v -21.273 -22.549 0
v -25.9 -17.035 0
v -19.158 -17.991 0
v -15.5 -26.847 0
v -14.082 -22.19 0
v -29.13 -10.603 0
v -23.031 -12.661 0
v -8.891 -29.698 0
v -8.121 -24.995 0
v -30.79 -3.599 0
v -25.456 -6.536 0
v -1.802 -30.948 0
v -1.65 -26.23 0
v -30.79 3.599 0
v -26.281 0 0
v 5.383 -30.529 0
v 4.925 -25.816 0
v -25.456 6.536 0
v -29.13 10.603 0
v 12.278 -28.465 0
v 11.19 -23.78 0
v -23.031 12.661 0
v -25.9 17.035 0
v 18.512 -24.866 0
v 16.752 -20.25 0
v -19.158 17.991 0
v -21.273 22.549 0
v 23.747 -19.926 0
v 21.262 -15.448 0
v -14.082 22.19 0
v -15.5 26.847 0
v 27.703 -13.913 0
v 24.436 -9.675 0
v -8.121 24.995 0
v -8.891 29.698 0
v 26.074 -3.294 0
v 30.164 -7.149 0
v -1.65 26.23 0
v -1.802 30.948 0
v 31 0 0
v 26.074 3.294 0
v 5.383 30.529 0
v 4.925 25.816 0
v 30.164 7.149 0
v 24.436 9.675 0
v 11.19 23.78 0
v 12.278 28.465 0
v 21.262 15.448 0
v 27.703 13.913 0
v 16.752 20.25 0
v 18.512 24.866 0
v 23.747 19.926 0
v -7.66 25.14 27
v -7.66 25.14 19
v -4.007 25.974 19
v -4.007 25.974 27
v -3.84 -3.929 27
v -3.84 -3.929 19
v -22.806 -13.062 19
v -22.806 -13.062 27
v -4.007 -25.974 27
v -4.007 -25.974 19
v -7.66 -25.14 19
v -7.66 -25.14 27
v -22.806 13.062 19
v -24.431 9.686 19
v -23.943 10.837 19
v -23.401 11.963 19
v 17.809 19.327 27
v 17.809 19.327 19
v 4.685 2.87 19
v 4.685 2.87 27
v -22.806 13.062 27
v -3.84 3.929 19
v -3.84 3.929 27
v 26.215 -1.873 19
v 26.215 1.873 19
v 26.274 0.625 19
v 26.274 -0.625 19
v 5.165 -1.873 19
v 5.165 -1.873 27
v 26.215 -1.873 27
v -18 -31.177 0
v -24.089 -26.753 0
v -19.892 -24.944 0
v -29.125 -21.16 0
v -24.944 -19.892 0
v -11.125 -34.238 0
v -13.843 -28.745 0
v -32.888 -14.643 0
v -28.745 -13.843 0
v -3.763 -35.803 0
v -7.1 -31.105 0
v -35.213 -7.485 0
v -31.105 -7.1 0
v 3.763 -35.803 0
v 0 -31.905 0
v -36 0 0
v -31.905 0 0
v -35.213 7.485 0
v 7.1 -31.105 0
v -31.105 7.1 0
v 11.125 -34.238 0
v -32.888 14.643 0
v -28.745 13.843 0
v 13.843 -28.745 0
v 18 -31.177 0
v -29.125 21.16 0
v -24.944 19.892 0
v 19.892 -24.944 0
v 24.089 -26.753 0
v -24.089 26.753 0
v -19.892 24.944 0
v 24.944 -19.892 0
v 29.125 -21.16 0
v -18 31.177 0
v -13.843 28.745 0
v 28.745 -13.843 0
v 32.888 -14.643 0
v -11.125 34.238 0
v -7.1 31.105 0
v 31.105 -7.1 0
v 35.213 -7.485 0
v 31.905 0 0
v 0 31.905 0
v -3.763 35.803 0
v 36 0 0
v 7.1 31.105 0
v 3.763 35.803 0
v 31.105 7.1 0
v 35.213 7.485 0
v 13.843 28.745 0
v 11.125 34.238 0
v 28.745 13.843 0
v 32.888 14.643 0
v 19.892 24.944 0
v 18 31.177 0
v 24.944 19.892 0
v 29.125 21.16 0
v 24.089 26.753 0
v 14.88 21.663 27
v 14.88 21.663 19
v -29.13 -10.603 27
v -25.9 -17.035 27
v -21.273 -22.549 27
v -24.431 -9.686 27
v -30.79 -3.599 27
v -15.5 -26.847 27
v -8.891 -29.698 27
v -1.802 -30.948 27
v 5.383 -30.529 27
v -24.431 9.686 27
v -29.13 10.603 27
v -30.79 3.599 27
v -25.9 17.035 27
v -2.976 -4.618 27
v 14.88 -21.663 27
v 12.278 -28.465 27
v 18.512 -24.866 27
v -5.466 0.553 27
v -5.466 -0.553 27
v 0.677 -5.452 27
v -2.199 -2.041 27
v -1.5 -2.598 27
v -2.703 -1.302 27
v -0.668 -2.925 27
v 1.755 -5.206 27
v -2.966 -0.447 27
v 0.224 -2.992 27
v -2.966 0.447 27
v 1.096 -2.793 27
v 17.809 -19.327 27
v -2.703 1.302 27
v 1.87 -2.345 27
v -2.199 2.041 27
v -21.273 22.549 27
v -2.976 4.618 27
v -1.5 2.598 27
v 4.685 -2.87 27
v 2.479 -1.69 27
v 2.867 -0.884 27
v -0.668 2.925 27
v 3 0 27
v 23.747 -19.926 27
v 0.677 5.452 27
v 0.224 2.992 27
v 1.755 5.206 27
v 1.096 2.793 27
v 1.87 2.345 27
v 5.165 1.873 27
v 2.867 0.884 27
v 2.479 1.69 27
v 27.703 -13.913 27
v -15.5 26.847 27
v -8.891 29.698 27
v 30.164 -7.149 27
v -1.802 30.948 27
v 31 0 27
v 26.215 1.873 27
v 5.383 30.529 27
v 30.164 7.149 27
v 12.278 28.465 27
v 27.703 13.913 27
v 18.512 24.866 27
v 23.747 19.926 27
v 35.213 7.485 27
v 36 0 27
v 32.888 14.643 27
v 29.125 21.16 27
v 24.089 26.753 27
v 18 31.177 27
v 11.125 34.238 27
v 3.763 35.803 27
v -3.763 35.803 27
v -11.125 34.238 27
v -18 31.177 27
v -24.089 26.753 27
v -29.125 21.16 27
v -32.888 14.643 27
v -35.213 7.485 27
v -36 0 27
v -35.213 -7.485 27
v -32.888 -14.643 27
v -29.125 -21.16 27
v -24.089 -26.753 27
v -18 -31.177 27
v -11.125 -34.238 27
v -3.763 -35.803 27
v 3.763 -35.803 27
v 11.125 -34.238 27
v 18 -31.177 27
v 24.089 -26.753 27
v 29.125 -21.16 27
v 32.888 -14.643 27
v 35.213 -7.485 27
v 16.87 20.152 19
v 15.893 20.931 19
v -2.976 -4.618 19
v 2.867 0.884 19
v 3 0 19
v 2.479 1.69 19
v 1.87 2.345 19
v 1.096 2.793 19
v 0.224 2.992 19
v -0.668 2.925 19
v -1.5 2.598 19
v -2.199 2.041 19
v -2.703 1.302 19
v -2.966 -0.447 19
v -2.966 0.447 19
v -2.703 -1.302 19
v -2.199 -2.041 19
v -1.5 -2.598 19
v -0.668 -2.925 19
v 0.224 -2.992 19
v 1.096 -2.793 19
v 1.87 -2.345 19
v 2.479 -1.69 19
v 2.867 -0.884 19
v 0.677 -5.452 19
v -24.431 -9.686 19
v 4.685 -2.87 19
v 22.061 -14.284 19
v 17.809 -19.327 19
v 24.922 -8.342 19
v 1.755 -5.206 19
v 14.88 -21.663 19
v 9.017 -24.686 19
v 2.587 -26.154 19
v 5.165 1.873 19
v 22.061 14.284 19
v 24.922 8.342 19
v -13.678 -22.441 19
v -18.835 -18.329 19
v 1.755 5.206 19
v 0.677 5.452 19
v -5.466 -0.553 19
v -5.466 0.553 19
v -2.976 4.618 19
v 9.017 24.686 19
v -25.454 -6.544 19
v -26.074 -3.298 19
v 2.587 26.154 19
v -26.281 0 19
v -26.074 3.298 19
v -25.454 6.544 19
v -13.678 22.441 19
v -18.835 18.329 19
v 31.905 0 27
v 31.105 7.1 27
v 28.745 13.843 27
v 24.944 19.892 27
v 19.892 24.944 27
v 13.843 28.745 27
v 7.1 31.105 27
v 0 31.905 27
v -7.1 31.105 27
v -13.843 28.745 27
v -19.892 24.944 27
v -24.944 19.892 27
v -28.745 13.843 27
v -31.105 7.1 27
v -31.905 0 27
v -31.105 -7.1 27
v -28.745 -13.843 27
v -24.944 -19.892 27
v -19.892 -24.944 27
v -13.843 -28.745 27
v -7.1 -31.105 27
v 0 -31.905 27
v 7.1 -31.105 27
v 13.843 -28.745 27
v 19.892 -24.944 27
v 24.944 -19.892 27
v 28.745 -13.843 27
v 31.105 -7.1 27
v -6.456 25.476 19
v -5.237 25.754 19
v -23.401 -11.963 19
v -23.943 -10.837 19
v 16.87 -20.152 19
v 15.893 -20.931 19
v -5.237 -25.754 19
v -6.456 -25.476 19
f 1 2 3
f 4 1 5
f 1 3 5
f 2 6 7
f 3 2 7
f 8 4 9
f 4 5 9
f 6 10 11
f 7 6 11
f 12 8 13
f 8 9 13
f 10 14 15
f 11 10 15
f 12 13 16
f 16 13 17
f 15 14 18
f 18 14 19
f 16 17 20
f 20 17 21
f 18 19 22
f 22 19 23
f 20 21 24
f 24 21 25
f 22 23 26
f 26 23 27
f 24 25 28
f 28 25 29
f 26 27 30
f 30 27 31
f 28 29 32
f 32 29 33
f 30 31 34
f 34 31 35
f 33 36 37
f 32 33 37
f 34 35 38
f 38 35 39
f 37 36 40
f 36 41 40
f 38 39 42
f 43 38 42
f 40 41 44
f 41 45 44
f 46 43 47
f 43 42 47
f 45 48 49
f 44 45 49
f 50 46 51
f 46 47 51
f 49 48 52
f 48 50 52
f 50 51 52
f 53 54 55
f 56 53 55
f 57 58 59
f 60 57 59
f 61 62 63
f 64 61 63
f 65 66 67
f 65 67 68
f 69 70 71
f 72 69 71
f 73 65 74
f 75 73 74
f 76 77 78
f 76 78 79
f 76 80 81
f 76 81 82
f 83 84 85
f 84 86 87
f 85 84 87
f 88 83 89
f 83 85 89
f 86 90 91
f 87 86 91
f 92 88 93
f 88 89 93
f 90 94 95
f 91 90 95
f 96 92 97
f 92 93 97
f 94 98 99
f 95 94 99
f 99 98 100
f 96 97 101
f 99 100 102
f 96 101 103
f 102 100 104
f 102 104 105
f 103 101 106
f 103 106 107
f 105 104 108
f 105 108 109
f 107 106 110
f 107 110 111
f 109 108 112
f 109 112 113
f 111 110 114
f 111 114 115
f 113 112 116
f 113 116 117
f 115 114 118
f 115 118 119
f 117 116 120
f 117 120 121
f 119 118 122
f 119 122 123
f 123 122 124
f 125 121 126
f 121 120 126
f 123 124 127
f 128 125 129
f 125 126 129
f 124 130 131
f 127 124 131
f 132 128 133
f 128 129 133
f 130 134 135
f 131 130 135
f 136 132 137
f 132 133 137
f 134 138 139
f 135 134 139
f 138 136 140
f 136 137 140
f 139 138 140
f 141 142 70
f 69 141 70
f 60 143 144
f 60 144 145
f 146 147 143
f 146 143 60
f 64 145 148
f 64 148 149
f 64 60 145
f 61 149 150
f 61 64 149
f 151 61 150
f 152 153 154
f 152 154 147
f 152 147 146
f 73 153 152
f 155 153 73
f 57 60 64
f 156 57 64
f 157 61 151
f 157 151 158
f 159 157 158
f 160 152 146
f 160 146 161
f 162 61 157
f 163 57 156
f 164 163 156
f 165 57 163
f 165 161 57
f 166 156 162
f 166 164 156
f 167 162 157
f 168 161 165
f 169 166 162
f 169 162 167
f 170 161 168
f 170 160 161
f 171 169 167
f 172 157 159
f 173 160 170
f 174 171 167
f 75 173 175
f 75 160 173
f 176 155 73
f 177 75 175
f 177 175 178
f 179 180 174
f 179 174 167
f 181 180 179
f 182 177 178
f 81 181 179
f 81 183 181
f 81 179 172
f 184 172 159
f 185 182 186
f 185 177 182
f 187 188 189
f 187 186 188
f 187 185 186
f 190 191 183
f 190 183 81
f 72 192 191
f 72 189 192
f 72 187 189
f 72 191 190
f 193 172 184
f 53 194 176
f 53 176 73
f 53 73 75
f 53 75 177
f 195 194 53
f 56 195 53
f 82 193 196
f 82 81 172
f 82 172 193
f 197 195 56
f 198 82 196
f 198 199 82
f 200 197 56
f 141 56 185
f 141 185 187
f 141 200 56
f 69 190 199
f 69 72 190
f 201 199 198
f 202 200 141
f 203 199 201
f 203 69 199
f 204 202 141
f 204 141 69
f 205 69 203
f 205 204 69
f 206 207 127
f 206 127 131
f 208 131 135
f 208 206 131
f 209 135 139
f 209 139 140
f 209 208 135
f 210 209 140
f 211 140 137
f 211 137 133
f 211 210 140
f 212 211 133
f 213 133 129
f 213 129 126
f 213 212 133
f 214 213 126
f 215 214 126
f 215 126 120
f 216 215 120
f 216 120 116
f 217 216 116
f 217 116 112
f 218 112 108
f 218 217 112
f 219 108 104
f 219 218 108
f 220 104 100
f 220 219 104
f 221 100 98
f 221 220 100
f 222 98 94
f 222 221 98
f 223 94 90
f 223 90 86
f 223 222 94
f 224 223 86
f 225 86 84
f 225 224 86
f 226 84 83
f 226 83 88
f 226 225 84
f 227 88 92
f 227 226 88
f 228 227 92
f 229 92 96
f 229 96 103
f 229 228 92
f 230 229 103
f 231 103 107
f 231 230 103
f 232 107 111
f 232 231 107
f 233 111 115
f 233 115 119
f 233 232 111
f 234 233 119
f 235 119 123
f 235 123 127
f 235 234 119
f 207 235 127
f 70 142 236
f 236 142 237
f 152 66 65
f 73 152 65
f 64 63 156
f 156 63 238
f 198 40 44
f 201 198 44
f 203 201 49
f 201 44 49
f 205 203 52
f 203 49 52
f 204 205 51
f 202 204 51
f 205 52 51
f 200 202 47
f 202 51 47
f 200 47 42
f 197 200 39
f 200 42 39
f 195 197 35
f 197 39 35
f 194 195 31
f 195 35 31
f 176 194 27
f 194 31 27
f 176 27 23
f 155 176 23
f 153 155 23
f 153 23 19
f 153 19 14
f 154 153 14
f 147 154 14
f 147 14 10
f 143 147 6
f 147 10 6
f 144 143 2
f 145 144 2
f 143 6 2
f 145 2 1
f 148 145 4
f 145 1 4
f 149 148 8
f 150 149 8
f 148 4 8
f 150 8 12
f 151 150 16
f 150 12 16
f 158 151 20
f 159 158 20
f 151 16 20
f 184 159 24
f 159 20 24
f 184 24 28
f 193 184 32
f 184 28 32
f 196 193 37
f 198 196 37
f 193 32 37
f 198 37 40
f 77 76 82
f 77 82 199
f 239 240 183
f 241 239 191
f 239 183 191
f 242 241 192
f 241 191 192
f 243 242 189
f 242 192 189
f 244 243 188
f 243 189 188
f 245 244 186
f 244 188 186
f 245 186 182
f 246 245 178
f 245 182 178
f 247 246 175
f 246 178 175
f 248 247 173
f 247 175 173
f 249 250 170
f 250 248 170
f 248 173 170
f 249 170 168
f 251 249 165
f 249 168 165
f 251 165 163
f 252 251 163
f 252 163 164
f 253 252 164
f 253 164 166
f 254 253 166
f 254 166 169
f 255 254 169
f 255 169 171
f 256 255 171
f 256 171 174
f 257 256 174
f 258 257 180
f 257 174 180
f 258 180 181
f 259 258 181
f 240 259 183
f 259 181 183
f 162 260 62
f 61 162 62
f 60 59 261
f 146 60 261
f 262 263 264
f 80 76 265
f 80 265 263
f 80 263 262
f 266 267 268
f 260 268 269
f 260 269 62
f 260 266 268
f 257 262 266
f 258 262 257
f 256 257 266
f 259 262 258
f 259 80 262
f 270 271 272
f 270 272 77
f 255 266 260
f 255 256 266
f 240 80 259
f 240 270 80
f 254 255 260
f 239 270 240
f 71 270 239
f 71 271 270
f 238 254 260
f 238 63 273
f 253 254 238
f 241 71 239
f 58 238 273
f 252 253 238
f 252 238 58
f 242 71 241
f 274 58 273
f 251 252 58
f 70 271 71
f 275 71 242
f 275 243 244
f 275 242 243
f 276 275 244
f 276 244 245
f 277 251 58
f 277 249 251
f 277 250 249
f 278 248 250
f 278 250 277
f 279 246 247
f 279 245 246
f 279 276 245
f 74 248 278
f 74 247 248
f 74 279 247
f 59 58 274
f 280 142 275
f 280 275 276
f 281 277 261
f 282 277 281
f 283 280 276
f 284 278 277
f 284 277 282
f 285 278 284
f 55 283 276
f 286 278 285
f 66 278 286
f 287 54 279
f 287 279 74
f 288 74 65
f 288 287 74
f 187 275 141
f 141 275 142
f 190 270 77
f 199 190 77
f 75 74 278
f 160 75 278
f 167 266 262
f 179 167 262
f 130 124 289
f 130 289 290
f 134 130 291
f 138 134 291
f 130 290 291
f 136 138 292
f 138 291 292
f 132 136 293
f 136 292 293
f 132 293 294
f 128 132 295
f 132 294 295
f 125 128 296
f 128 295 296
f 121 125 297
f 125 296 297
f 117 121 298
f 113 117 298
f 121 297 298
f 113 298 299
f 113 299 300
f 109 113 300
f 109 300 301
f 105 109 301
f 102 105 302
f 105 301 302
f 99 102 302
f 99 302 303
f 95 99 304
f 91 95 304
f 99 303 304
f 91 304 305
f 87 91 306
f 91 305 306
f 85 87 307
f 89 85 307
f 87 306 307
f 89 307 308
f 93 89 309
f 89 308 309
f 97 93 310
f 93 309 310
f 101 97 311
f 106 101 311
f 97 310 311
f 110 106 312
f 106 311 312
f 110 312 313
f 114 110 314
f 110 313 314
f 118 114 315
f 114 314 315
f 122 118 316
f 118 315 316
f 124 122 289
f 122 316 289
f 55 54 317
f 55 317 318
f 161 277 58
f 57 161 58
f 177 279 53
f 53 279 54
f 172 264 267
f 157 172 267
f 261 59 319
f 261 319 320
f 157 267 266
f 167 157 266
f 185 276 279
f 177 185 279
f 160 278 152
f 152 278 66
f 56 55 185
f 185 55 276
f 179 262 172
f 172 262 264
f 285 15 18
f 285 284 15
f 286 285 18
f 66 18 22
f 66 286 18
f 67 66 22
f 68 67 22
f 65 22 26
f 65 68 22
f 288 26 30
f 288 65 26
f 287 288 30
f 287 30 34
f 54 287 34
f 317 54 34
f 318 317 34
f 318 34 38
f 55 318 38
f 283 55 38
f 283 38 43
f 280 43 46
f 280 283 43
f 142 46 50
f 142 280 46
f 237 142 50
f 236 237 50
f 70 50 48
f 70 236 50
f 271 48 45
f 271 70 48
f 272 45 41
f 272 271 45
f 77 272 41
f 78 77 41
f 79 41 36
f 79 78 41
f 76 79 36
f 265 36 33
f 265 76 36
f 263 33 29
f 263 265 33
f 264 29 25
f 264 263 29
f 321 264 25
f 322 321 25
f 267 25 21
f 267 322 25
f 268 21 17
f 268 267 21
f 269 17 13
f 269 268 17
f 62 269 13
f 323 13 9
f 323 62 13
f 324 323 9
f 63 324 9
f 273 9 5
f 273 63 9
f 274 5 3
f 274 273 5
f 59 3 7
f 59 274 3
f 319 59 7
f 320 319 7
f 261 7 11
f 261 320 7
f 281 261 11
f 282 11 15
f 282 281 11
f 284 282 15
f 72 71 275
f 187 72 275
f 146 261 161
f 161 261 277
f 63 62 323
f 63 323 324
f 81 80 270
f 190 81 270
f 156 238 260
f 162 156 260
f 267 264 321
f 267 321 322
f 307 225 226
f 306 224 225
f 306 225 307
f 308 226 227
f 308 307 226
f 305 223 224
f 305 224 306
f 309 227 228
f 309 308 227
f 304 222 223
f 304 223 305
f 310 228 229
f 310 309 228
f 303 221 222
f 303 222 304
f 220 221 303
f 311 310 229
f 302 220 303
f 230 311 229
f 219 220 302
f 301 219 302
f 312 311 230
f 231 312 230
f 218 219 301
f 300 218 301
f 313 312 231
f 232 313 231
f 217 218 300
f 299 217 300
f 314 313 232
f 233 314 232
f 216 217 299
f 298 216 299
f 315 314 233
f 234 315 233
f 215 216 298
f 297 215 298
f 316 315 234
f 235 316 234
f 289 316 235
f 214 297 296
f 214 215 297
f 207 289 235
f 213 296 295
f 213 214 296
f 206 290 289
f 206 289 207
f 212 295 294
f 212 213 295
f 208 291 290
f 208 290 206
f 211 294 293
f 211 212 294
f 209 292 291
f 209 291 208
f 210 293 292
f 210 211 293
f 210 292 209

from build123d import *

# Parameters (mm, degrees)
ESQUISSE1_R             = 31
ESQUISSE1_W             = 21.049984125
ESQUISSE1_H             = 3.746915328
BOSS_EXTRU_1_DEPTH      = 27
ESQUISSE2_R             = 3
ENL_V_MAT_EXTRU_1_DEPTH = 27
ESQUISSE3_R             = 36
ESQUISSE3_R_2           = 31.904878758
BOSS_EXTRU_2_DEPTH      = 27
ENL_V_START             = -19
ESQUISSE4_R             = 26.281409308
ESQUISSE4_R_2           = 3
ENL_V_MAT_EXTRU_2_DEPTH = 19


with BuildPart() as part:
    # Esquisse1 → Boss.-Extru.1 (new body)
    with BuildSketch(Plane.XY):
        Circle(ESQUISSE1_R)
        with Locations((15.689557936, 0)):
            Rectangle(ESQUISSE1_W, ESQUISSE1_H, mode=Mode.SUBTRACT)
        Polygon((1.75532597, -5.20590194), (4.684782335, -2.869738445), (17.809232767, -19.32727874), (14.879776402, -21.663442235), align=None, mode=Mode.SUBTRACT)
        Polygon((-2.97571019, -4.618195874), (0.677262147, -5.451962973), (-4.00679998, -25.974180047), (-7.659772317, -25.140412949), align=None, mode=Mode.SUBTRACT)
        Polygon((-5.465975884, -0.552894122), (-3.840250251, -3.928748182), (-22.805630618, -13.061994003), (-24.431356251, -9.686139942), align=None, mode=Mode.SUBTRACT)
        Polygon((-3.840250251, 3.928748182), (-5.465975884, 0.552894122), (-24.431356251, 9.686139942), (-22.805630618, 13.061994003), align=None, mode=Mode.SUBTRACT)
        Polygon((0.677262147, 5.451962973), (-2.97571019, 4.618195874), (-7.659772317, 25.140412949), (-4.00679998, 25.974180047), align=None, mode=Mode.SUBTRACT)
        Polygon((4.684782335, 2.869738445), (1.75532597, 5.20590194), (14.879776402, 21.663442235), (17.809232767, 19.32727874), align=None, mode=Mode.SUBTRACT)
    extrude(amount=BOSS_EXTRU_1_DEPTH)

    # Esquisse2 → Enlèv. mat.-Extru.1 (cut)
    with BuildSketch(Plane.XY.offset(27)):
        Circle(ESQUISSE2_R)
    extrude(amount=-ENL_V_MAT_EXTRU_1_DEPTH, mode=Mode.SUBTRACT)

    # Esquisse4 → Enlèv. mat.-Extru.2 (cut)
    with BuildSketch(Plane(origin=(0, 0, 0), x_dir=(-1, 0, 0), z_dir=(0, 0, -1)).offset(ENL_V_START)):
        Circle(ESQUISSE4_R)
        with Locations(Location((0, 0, 0), (0, 0, 180))):
            Circle(ESQUISSE4_R_2, mode=Mode.SUBTRACT)
    extrude(amount=ENL_V_MAT_EXTRU_2_DEPTH, mode=Mode.SUBTRACT)


with BuildPart() as body_2:
    # Esquisse3 → Boss.-Extru.2 (new, through all)
    with BuildSketch(Plane.XY.offset(27)):
        Circle(ESQUISSE3_R)
        Circle(ESQUISSE3_R_2, mode=Mode.SUBTRACT)
    extrude(amount=-BOSS_EXTRU_2_DEPTH)


solid = Compound([part.part, body_2.part])
